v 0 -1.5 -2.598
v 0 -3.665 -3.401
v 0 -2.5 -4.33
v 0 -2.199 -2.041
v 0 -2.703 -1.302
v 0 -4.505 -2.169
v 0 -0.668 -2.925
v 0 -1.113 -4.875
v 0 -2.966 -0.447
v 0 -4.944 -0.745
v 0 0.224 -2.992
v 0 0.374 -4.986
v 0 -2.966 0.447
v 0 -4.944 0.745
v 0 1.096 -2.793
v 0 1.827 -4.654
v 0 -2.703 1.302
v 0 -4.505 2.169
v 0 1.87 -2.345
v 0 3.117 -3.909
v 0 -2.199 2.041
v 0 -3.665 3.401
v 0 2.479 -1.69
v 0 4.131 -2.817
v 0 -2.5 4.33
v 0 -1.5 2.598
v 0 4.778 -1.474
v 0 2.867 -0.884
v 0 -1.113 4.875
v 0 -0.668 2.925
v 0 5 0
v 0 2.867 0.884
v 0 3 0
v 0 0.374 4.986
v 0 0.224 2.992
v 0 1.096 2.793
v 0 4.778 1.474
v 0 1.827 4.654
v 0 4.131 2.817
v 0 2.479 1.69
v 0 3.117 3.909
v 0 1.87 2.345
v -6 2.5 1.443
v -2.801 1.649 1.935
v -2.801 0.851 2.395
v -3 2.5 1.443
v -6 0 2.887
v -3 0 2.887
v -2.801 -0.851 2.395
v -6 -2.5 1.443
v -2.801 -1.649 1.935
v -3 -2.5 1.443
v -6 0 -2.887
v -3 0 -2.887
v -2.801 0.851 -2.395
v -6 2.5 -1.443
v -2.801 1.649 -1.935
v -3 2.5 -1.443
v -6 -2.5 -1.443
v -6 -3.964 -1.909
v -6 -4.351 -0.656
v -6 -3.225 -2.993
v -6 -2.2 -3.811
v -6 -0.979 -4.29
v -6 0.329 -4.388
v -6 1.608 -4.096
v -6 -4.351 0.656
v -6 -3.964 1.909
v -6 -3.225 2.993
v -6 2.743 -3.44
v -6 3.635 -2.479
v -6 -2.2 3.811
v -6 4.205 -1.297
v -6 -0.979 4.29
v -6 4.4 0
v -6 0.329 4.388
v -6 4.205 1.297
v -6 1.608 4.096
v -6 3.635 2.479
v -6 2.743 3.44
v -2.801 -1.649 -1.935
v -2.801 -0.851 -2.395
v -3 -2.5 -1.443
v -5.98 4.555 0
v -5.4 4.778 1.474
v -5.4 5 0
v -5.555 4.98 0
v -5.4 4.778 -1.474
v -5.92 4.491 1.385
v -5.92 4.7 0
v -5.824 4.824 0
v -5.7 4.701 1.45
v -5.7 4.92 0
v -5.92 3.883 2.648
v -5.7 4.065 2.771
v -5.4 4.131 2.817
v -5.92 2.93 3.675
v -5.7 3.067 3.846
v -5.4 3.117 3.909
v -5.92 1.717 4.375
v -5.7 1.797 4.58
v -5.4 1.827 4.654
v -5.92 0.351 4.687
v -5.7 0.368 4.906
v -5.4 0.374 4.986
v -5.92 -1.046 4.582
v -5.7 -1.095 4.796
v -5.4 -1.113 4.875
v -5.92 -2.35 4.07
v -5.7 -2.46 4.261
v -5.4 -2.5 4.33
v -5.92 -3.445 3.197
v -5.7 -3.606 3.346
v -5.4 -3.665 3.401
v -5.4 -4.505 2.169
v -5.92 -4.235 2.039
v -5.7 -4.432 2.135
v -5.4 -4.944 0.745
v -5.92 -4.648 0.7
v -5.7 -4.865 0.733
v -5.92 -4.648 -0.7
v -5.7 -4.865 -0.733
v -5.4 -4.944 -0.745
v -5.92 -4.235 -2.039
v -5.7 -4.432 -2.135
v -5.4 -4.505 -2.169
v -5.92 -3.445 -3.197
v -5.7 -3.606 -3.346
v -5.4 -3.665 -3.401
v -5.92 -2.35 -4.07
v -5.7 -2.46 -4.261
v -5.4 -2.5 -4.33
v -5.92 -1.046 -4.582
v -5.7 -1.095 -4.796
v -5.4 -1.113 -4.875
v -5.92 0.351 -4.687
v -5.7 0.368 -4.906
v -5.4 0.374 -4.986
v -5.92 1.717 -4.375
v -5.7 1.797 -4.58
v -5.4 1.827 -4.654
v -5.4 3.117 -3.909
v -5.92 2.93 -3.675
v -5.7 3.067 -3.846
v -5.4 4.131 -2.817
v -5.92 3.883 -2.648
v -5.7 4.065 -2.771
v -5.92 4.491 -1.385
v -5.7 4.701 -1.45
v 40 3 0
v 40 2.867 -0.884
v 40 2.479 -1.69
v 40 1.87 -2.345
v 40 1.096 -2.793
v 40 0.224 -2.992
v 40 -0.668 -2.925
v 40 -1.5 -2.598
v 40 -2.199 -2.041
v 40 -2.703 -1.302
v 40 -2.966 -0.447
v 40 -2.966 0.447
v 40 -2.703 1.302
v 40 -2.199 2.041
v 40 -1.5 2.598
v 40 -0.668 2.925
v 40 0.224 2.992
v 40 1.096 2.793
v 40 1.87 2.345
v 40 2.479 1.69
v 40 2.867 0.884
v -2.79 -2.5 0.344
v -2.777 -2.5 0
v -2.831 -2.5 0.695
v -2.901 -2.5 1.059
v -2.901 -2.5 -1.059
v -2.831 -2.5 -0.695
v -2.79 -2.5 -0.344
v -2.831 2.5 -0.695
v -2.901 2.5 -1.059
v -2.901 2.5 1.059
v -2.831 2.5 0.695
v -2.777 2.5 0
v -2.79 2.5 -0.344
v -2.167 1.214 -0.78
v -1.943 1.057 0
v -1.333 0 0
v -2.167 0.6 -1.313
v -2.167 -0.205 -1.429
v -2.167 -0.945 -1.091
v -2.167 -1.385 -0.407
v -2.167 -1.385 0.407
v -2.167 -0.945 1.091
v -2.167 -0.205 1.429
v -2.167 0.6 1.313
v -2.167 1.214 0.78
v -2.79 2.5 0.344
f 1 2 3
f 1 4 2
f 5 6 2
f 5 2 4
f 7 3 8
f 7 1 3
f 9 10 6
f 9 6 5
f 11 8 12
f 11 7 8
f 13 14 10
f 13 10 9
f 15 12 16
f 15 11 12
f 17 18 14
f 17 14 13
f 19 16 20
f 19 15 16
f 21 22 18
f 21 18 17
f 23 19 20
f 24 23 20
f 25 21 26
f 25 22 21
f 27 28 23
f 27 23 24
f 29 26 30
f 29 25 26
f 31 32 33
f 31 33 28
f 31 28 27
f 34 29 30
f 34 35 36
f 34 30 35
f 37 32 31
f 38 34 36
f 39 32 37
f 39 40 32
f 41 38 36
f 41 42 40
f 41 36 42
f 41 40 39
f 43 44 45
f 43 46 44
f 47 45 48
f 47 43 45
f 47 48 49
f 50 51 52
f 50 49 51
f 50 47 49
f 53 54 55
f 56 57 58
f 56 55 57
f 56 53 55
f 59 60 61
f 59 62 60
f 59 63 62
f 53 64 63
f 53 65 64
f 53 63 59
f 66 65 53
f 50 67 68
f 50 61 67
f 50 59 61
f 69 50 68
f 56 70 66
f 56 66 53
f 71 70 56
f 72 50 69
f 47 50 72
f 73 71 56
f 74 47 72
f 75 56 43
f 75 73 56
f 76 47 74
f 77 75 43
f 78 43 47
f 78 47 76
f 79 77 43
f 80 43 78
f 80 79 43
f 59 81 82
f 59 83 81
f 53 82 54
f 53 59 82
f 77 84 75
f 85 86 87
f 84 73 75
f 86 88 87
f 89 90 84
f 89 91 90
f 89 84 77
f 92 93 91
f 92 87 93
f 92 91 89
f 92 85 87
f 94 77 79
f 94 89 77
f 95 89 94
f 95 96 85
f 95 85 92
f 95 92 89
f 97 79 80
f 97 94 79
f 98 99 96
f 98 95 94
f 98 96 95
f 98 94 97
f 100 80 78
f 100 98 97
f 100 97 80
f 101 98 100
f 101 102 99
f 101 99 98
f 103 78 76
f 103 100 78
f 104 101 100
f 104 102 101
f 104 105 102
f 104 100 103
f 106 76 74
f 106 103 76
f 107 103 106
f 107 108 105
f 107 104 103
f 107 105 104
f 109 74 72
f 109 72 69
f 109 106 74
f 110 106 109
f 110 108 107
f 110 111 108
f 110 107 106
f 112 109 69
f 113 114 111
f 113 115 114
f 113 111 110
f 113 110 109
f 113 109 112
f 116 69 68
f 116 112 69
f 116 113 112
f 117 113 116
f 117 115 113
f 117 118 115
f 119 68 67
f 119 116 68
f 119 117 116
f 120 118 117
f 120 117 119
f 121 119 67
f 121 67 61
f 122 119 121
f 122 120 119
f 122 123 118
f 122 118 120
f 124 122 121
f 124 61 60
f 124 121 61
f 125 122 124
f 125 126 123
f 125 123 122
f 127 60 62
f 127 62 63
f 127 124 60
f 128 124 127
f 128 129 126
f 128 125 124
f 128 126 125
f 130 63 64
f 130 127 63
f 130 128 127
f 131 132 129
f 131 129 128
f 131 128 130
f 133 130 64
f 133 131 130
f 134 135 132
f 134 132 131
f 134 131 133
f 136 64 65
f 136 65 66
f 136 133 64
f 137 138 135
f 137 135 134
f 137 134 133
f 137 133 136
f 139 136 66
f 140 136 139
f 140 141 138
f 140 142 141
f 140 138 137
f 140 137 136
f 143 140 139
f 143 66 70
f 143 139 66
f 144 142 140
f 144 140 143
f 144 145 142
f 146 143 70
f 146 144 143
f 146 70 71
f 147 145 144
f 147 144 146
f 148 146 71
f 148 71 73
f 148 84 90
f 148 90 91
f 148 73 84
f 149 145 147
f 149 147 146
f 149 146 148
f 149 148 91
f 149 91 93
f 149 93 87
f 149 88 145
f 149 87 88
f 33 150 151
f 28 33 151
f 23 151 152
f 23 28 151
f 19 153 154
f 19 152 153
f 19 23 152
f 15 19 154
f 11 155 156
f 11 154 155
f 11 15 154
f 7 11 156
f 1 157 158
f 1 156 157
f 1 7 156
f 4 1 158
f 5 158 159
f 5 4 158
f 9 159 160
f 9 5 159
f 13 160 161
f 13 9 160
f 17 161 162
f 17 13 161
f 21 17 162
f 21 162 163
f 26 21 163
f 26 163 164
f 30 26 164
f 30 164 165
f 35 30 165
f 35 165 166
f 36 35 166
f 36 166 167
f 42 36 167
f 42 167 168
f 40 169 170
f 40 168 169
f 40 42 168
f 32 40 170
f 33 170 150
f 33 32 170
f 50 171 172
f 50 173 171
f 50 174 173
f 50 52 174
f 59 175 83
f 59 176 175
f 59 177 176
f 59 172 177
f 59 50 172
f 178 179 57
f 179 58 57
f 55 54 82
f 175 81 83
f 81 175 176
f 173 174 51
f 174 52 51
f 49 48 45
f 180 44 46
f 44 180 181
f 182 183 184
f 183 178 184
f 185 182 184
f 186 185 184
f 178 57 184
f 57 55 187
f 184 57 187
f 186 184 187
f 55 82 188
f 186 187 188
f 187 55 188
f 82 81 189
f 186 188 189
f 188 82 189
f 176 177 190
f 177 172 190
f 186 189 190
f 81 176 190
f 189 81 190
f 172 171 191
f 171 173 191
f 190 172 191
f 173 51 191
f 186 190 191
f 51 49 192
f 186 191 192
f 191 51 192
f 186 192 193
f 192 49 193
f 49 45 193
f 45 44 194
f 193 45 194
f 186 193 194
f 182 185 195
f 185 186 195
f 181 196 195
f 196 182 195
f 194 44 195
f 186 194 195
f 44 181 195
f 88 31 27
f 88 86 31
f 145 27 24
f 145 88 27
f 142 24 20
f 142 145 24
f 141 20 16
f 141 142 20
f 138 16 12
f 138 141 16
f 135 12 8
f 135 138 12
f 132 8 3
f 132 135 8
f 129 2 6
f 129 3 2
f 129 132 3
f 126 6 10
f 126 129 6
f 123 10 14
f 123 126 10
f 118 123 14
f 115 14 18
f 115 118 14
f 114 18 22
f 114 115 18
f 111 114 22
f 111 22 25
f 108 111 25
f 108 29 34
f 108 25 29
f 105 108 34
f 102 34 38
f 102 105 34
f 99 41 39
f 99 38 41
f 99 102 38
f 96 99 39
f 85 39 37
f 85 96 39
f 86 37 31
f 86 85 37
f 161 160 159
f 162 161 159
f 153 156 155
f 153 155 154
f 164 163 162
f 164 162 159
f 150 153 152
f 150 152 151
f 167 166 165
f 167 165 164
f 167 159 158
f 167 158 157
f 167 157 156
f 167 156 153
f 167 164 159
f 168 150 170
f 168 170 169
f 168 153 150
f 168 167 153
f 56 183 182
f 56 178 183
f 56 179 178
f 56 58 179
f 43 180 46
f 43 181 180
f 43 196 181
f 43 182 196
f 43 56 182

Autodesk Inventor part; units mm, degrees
ref_plane "YZ Plane" through (0, 0, 0) normal (1, 0, 0) x (0, 1, 0)
ref_plane "XZ Plane" through (0, 0, 0) normal (0, 1, 0) x (-1, 0, 0)
ref_plane "XY Plane" through (0, 0, 0) normal (0, 0, 1) x (1, 0, 0)
sketch "Sketch1" plane through (0, 0, 0) normal (0, 0, 1) x (1, 0, 0)
  line L0 (-1.3333, 0) -> (40, 0)
  line L1 (40, 0) -> (40, 3)
  line L2 (40, 3) -> (16, 3)
  line L3 (16, 3) -> (15.3864, 3)
  line L4 (15.3864, 3) -> (0, 3)
  line L5 (0, 3) -> (0, 5)
  line L6 (0, 5) -> (-6, 5)
  line L7 (-6, 5) -> (-6, 2.8868)
  line L8 (-6, 2.8868) -> (-3, 2.8868)
  line L9 (-3, 2.8868) -> (-1.3333, 0)
  line L10 (-15.2, 0) -> (49.2, 0) projected
  line L11 (0, -1) -> (0, 6) projected
  line L12 (16, 3) -> (0, 3) construction
  dimension "d1" = 24
  dimension "d2" = 0.6136
  dimension "d3" = 6
  dimension "d4" = 3
  dimension "d5" = 60
  dimension "d6" = 6
  dimension "d7" = 6
  dimension "d8" = 5.7735
  dimension "d9" = 10
  dimension "d26" = 40
revolve "Body" add sketch "Sketch1" angle 360 about axis through (-1.3333, 0, 0) along (1, 0, 0)
sketch "Sketch2" plane through (-6, 0, 0) normal (-1, 0, 0) x (0, 0, 1)
  circle A0 centre (0, 0) radius 2.8868 projected
  line L0 (0, -7) -> (0, 7) projected
  line L1 (-7, 0) -> (7, 0) projected
  line L2 (2.8868, 0) -> (1.4434, -2.5)
  line L3 (1.4434, -2.5) -> (-1.4434, -2.5)
  line L4 (-1.4434, -2.5) -> (-2.8868, 0)
  line L5 (-2.8868, 0) -> (-1.4434, 2.5)
  line L6 (-1.4434, 2.5) -> (1.4434, 2.5)
  line L7 (1.4434, 2.5) -> (2.8868, 0)
extrude "Slot" add sketch "Sketch2" against normal up to next contours L7 A0 | A0 L2 | L6 L0 A0 | A0 L0 L3 | L0 L6 A0 | A0 L3 L0 | L4 A0 | A0 L5
fillet "Fillet1" radius 0.6 1 edges at (-6, -5, 0)
thread "Thread" size "M6x1" class "6g" standard "ISO Metric profile" length 24
equation "\"d1\" = GEL"
equation "\"d3\" = KOH"
equation "\"d4\" = INTI"
equation "\"d6\" = GD"
equation "\"d7\" = BDM"
equation "\"d8\" = 1.1547 * SW"
equation "\"d9\" = KOD"
equation "\"d26\" = NLG"
equation "\"d17\" = RR"
equation "\"d13\" = GEL"
equation "\"GD\" = 6"
equation "\"NLG\" = 40"
equation "\"GEL\" = 24"
equation "\"KOD\" = 10"
equation "\"KOH\" = 6"
equation "\"INTI\" = 3"
equation "\"GAL\" = 0.61345 * PTC"
equation "\"GUL\" = 0.61345 * PTC"
equation "\"BDM\" = NND"
equation "\"SW\" = 5"
equation "\"RR\" = 0.6"
equation "\"SPD\" = NND - 1.2269 * PTC"
equation "\"R\" = 0.1"
equation "\"TOA\" = 30deg"
equation "\"GD1\" = THREADDIA - 1.2269 * PTC"
equation "\"THREADDIA\" = 6"
equation "\"FAWI\" = 45deg"
equation "\"PTC\" = 1"
equation "\"NND\" = 6"
equation "\"E0\" = 1.155 * SW"
equation "\"d38\" = 55deg"
equation "\"Sketch4_Pitch\" = 1"
properties part number "ISO 4762 - M6 x 40" material "Stainless Steel, 440C"
